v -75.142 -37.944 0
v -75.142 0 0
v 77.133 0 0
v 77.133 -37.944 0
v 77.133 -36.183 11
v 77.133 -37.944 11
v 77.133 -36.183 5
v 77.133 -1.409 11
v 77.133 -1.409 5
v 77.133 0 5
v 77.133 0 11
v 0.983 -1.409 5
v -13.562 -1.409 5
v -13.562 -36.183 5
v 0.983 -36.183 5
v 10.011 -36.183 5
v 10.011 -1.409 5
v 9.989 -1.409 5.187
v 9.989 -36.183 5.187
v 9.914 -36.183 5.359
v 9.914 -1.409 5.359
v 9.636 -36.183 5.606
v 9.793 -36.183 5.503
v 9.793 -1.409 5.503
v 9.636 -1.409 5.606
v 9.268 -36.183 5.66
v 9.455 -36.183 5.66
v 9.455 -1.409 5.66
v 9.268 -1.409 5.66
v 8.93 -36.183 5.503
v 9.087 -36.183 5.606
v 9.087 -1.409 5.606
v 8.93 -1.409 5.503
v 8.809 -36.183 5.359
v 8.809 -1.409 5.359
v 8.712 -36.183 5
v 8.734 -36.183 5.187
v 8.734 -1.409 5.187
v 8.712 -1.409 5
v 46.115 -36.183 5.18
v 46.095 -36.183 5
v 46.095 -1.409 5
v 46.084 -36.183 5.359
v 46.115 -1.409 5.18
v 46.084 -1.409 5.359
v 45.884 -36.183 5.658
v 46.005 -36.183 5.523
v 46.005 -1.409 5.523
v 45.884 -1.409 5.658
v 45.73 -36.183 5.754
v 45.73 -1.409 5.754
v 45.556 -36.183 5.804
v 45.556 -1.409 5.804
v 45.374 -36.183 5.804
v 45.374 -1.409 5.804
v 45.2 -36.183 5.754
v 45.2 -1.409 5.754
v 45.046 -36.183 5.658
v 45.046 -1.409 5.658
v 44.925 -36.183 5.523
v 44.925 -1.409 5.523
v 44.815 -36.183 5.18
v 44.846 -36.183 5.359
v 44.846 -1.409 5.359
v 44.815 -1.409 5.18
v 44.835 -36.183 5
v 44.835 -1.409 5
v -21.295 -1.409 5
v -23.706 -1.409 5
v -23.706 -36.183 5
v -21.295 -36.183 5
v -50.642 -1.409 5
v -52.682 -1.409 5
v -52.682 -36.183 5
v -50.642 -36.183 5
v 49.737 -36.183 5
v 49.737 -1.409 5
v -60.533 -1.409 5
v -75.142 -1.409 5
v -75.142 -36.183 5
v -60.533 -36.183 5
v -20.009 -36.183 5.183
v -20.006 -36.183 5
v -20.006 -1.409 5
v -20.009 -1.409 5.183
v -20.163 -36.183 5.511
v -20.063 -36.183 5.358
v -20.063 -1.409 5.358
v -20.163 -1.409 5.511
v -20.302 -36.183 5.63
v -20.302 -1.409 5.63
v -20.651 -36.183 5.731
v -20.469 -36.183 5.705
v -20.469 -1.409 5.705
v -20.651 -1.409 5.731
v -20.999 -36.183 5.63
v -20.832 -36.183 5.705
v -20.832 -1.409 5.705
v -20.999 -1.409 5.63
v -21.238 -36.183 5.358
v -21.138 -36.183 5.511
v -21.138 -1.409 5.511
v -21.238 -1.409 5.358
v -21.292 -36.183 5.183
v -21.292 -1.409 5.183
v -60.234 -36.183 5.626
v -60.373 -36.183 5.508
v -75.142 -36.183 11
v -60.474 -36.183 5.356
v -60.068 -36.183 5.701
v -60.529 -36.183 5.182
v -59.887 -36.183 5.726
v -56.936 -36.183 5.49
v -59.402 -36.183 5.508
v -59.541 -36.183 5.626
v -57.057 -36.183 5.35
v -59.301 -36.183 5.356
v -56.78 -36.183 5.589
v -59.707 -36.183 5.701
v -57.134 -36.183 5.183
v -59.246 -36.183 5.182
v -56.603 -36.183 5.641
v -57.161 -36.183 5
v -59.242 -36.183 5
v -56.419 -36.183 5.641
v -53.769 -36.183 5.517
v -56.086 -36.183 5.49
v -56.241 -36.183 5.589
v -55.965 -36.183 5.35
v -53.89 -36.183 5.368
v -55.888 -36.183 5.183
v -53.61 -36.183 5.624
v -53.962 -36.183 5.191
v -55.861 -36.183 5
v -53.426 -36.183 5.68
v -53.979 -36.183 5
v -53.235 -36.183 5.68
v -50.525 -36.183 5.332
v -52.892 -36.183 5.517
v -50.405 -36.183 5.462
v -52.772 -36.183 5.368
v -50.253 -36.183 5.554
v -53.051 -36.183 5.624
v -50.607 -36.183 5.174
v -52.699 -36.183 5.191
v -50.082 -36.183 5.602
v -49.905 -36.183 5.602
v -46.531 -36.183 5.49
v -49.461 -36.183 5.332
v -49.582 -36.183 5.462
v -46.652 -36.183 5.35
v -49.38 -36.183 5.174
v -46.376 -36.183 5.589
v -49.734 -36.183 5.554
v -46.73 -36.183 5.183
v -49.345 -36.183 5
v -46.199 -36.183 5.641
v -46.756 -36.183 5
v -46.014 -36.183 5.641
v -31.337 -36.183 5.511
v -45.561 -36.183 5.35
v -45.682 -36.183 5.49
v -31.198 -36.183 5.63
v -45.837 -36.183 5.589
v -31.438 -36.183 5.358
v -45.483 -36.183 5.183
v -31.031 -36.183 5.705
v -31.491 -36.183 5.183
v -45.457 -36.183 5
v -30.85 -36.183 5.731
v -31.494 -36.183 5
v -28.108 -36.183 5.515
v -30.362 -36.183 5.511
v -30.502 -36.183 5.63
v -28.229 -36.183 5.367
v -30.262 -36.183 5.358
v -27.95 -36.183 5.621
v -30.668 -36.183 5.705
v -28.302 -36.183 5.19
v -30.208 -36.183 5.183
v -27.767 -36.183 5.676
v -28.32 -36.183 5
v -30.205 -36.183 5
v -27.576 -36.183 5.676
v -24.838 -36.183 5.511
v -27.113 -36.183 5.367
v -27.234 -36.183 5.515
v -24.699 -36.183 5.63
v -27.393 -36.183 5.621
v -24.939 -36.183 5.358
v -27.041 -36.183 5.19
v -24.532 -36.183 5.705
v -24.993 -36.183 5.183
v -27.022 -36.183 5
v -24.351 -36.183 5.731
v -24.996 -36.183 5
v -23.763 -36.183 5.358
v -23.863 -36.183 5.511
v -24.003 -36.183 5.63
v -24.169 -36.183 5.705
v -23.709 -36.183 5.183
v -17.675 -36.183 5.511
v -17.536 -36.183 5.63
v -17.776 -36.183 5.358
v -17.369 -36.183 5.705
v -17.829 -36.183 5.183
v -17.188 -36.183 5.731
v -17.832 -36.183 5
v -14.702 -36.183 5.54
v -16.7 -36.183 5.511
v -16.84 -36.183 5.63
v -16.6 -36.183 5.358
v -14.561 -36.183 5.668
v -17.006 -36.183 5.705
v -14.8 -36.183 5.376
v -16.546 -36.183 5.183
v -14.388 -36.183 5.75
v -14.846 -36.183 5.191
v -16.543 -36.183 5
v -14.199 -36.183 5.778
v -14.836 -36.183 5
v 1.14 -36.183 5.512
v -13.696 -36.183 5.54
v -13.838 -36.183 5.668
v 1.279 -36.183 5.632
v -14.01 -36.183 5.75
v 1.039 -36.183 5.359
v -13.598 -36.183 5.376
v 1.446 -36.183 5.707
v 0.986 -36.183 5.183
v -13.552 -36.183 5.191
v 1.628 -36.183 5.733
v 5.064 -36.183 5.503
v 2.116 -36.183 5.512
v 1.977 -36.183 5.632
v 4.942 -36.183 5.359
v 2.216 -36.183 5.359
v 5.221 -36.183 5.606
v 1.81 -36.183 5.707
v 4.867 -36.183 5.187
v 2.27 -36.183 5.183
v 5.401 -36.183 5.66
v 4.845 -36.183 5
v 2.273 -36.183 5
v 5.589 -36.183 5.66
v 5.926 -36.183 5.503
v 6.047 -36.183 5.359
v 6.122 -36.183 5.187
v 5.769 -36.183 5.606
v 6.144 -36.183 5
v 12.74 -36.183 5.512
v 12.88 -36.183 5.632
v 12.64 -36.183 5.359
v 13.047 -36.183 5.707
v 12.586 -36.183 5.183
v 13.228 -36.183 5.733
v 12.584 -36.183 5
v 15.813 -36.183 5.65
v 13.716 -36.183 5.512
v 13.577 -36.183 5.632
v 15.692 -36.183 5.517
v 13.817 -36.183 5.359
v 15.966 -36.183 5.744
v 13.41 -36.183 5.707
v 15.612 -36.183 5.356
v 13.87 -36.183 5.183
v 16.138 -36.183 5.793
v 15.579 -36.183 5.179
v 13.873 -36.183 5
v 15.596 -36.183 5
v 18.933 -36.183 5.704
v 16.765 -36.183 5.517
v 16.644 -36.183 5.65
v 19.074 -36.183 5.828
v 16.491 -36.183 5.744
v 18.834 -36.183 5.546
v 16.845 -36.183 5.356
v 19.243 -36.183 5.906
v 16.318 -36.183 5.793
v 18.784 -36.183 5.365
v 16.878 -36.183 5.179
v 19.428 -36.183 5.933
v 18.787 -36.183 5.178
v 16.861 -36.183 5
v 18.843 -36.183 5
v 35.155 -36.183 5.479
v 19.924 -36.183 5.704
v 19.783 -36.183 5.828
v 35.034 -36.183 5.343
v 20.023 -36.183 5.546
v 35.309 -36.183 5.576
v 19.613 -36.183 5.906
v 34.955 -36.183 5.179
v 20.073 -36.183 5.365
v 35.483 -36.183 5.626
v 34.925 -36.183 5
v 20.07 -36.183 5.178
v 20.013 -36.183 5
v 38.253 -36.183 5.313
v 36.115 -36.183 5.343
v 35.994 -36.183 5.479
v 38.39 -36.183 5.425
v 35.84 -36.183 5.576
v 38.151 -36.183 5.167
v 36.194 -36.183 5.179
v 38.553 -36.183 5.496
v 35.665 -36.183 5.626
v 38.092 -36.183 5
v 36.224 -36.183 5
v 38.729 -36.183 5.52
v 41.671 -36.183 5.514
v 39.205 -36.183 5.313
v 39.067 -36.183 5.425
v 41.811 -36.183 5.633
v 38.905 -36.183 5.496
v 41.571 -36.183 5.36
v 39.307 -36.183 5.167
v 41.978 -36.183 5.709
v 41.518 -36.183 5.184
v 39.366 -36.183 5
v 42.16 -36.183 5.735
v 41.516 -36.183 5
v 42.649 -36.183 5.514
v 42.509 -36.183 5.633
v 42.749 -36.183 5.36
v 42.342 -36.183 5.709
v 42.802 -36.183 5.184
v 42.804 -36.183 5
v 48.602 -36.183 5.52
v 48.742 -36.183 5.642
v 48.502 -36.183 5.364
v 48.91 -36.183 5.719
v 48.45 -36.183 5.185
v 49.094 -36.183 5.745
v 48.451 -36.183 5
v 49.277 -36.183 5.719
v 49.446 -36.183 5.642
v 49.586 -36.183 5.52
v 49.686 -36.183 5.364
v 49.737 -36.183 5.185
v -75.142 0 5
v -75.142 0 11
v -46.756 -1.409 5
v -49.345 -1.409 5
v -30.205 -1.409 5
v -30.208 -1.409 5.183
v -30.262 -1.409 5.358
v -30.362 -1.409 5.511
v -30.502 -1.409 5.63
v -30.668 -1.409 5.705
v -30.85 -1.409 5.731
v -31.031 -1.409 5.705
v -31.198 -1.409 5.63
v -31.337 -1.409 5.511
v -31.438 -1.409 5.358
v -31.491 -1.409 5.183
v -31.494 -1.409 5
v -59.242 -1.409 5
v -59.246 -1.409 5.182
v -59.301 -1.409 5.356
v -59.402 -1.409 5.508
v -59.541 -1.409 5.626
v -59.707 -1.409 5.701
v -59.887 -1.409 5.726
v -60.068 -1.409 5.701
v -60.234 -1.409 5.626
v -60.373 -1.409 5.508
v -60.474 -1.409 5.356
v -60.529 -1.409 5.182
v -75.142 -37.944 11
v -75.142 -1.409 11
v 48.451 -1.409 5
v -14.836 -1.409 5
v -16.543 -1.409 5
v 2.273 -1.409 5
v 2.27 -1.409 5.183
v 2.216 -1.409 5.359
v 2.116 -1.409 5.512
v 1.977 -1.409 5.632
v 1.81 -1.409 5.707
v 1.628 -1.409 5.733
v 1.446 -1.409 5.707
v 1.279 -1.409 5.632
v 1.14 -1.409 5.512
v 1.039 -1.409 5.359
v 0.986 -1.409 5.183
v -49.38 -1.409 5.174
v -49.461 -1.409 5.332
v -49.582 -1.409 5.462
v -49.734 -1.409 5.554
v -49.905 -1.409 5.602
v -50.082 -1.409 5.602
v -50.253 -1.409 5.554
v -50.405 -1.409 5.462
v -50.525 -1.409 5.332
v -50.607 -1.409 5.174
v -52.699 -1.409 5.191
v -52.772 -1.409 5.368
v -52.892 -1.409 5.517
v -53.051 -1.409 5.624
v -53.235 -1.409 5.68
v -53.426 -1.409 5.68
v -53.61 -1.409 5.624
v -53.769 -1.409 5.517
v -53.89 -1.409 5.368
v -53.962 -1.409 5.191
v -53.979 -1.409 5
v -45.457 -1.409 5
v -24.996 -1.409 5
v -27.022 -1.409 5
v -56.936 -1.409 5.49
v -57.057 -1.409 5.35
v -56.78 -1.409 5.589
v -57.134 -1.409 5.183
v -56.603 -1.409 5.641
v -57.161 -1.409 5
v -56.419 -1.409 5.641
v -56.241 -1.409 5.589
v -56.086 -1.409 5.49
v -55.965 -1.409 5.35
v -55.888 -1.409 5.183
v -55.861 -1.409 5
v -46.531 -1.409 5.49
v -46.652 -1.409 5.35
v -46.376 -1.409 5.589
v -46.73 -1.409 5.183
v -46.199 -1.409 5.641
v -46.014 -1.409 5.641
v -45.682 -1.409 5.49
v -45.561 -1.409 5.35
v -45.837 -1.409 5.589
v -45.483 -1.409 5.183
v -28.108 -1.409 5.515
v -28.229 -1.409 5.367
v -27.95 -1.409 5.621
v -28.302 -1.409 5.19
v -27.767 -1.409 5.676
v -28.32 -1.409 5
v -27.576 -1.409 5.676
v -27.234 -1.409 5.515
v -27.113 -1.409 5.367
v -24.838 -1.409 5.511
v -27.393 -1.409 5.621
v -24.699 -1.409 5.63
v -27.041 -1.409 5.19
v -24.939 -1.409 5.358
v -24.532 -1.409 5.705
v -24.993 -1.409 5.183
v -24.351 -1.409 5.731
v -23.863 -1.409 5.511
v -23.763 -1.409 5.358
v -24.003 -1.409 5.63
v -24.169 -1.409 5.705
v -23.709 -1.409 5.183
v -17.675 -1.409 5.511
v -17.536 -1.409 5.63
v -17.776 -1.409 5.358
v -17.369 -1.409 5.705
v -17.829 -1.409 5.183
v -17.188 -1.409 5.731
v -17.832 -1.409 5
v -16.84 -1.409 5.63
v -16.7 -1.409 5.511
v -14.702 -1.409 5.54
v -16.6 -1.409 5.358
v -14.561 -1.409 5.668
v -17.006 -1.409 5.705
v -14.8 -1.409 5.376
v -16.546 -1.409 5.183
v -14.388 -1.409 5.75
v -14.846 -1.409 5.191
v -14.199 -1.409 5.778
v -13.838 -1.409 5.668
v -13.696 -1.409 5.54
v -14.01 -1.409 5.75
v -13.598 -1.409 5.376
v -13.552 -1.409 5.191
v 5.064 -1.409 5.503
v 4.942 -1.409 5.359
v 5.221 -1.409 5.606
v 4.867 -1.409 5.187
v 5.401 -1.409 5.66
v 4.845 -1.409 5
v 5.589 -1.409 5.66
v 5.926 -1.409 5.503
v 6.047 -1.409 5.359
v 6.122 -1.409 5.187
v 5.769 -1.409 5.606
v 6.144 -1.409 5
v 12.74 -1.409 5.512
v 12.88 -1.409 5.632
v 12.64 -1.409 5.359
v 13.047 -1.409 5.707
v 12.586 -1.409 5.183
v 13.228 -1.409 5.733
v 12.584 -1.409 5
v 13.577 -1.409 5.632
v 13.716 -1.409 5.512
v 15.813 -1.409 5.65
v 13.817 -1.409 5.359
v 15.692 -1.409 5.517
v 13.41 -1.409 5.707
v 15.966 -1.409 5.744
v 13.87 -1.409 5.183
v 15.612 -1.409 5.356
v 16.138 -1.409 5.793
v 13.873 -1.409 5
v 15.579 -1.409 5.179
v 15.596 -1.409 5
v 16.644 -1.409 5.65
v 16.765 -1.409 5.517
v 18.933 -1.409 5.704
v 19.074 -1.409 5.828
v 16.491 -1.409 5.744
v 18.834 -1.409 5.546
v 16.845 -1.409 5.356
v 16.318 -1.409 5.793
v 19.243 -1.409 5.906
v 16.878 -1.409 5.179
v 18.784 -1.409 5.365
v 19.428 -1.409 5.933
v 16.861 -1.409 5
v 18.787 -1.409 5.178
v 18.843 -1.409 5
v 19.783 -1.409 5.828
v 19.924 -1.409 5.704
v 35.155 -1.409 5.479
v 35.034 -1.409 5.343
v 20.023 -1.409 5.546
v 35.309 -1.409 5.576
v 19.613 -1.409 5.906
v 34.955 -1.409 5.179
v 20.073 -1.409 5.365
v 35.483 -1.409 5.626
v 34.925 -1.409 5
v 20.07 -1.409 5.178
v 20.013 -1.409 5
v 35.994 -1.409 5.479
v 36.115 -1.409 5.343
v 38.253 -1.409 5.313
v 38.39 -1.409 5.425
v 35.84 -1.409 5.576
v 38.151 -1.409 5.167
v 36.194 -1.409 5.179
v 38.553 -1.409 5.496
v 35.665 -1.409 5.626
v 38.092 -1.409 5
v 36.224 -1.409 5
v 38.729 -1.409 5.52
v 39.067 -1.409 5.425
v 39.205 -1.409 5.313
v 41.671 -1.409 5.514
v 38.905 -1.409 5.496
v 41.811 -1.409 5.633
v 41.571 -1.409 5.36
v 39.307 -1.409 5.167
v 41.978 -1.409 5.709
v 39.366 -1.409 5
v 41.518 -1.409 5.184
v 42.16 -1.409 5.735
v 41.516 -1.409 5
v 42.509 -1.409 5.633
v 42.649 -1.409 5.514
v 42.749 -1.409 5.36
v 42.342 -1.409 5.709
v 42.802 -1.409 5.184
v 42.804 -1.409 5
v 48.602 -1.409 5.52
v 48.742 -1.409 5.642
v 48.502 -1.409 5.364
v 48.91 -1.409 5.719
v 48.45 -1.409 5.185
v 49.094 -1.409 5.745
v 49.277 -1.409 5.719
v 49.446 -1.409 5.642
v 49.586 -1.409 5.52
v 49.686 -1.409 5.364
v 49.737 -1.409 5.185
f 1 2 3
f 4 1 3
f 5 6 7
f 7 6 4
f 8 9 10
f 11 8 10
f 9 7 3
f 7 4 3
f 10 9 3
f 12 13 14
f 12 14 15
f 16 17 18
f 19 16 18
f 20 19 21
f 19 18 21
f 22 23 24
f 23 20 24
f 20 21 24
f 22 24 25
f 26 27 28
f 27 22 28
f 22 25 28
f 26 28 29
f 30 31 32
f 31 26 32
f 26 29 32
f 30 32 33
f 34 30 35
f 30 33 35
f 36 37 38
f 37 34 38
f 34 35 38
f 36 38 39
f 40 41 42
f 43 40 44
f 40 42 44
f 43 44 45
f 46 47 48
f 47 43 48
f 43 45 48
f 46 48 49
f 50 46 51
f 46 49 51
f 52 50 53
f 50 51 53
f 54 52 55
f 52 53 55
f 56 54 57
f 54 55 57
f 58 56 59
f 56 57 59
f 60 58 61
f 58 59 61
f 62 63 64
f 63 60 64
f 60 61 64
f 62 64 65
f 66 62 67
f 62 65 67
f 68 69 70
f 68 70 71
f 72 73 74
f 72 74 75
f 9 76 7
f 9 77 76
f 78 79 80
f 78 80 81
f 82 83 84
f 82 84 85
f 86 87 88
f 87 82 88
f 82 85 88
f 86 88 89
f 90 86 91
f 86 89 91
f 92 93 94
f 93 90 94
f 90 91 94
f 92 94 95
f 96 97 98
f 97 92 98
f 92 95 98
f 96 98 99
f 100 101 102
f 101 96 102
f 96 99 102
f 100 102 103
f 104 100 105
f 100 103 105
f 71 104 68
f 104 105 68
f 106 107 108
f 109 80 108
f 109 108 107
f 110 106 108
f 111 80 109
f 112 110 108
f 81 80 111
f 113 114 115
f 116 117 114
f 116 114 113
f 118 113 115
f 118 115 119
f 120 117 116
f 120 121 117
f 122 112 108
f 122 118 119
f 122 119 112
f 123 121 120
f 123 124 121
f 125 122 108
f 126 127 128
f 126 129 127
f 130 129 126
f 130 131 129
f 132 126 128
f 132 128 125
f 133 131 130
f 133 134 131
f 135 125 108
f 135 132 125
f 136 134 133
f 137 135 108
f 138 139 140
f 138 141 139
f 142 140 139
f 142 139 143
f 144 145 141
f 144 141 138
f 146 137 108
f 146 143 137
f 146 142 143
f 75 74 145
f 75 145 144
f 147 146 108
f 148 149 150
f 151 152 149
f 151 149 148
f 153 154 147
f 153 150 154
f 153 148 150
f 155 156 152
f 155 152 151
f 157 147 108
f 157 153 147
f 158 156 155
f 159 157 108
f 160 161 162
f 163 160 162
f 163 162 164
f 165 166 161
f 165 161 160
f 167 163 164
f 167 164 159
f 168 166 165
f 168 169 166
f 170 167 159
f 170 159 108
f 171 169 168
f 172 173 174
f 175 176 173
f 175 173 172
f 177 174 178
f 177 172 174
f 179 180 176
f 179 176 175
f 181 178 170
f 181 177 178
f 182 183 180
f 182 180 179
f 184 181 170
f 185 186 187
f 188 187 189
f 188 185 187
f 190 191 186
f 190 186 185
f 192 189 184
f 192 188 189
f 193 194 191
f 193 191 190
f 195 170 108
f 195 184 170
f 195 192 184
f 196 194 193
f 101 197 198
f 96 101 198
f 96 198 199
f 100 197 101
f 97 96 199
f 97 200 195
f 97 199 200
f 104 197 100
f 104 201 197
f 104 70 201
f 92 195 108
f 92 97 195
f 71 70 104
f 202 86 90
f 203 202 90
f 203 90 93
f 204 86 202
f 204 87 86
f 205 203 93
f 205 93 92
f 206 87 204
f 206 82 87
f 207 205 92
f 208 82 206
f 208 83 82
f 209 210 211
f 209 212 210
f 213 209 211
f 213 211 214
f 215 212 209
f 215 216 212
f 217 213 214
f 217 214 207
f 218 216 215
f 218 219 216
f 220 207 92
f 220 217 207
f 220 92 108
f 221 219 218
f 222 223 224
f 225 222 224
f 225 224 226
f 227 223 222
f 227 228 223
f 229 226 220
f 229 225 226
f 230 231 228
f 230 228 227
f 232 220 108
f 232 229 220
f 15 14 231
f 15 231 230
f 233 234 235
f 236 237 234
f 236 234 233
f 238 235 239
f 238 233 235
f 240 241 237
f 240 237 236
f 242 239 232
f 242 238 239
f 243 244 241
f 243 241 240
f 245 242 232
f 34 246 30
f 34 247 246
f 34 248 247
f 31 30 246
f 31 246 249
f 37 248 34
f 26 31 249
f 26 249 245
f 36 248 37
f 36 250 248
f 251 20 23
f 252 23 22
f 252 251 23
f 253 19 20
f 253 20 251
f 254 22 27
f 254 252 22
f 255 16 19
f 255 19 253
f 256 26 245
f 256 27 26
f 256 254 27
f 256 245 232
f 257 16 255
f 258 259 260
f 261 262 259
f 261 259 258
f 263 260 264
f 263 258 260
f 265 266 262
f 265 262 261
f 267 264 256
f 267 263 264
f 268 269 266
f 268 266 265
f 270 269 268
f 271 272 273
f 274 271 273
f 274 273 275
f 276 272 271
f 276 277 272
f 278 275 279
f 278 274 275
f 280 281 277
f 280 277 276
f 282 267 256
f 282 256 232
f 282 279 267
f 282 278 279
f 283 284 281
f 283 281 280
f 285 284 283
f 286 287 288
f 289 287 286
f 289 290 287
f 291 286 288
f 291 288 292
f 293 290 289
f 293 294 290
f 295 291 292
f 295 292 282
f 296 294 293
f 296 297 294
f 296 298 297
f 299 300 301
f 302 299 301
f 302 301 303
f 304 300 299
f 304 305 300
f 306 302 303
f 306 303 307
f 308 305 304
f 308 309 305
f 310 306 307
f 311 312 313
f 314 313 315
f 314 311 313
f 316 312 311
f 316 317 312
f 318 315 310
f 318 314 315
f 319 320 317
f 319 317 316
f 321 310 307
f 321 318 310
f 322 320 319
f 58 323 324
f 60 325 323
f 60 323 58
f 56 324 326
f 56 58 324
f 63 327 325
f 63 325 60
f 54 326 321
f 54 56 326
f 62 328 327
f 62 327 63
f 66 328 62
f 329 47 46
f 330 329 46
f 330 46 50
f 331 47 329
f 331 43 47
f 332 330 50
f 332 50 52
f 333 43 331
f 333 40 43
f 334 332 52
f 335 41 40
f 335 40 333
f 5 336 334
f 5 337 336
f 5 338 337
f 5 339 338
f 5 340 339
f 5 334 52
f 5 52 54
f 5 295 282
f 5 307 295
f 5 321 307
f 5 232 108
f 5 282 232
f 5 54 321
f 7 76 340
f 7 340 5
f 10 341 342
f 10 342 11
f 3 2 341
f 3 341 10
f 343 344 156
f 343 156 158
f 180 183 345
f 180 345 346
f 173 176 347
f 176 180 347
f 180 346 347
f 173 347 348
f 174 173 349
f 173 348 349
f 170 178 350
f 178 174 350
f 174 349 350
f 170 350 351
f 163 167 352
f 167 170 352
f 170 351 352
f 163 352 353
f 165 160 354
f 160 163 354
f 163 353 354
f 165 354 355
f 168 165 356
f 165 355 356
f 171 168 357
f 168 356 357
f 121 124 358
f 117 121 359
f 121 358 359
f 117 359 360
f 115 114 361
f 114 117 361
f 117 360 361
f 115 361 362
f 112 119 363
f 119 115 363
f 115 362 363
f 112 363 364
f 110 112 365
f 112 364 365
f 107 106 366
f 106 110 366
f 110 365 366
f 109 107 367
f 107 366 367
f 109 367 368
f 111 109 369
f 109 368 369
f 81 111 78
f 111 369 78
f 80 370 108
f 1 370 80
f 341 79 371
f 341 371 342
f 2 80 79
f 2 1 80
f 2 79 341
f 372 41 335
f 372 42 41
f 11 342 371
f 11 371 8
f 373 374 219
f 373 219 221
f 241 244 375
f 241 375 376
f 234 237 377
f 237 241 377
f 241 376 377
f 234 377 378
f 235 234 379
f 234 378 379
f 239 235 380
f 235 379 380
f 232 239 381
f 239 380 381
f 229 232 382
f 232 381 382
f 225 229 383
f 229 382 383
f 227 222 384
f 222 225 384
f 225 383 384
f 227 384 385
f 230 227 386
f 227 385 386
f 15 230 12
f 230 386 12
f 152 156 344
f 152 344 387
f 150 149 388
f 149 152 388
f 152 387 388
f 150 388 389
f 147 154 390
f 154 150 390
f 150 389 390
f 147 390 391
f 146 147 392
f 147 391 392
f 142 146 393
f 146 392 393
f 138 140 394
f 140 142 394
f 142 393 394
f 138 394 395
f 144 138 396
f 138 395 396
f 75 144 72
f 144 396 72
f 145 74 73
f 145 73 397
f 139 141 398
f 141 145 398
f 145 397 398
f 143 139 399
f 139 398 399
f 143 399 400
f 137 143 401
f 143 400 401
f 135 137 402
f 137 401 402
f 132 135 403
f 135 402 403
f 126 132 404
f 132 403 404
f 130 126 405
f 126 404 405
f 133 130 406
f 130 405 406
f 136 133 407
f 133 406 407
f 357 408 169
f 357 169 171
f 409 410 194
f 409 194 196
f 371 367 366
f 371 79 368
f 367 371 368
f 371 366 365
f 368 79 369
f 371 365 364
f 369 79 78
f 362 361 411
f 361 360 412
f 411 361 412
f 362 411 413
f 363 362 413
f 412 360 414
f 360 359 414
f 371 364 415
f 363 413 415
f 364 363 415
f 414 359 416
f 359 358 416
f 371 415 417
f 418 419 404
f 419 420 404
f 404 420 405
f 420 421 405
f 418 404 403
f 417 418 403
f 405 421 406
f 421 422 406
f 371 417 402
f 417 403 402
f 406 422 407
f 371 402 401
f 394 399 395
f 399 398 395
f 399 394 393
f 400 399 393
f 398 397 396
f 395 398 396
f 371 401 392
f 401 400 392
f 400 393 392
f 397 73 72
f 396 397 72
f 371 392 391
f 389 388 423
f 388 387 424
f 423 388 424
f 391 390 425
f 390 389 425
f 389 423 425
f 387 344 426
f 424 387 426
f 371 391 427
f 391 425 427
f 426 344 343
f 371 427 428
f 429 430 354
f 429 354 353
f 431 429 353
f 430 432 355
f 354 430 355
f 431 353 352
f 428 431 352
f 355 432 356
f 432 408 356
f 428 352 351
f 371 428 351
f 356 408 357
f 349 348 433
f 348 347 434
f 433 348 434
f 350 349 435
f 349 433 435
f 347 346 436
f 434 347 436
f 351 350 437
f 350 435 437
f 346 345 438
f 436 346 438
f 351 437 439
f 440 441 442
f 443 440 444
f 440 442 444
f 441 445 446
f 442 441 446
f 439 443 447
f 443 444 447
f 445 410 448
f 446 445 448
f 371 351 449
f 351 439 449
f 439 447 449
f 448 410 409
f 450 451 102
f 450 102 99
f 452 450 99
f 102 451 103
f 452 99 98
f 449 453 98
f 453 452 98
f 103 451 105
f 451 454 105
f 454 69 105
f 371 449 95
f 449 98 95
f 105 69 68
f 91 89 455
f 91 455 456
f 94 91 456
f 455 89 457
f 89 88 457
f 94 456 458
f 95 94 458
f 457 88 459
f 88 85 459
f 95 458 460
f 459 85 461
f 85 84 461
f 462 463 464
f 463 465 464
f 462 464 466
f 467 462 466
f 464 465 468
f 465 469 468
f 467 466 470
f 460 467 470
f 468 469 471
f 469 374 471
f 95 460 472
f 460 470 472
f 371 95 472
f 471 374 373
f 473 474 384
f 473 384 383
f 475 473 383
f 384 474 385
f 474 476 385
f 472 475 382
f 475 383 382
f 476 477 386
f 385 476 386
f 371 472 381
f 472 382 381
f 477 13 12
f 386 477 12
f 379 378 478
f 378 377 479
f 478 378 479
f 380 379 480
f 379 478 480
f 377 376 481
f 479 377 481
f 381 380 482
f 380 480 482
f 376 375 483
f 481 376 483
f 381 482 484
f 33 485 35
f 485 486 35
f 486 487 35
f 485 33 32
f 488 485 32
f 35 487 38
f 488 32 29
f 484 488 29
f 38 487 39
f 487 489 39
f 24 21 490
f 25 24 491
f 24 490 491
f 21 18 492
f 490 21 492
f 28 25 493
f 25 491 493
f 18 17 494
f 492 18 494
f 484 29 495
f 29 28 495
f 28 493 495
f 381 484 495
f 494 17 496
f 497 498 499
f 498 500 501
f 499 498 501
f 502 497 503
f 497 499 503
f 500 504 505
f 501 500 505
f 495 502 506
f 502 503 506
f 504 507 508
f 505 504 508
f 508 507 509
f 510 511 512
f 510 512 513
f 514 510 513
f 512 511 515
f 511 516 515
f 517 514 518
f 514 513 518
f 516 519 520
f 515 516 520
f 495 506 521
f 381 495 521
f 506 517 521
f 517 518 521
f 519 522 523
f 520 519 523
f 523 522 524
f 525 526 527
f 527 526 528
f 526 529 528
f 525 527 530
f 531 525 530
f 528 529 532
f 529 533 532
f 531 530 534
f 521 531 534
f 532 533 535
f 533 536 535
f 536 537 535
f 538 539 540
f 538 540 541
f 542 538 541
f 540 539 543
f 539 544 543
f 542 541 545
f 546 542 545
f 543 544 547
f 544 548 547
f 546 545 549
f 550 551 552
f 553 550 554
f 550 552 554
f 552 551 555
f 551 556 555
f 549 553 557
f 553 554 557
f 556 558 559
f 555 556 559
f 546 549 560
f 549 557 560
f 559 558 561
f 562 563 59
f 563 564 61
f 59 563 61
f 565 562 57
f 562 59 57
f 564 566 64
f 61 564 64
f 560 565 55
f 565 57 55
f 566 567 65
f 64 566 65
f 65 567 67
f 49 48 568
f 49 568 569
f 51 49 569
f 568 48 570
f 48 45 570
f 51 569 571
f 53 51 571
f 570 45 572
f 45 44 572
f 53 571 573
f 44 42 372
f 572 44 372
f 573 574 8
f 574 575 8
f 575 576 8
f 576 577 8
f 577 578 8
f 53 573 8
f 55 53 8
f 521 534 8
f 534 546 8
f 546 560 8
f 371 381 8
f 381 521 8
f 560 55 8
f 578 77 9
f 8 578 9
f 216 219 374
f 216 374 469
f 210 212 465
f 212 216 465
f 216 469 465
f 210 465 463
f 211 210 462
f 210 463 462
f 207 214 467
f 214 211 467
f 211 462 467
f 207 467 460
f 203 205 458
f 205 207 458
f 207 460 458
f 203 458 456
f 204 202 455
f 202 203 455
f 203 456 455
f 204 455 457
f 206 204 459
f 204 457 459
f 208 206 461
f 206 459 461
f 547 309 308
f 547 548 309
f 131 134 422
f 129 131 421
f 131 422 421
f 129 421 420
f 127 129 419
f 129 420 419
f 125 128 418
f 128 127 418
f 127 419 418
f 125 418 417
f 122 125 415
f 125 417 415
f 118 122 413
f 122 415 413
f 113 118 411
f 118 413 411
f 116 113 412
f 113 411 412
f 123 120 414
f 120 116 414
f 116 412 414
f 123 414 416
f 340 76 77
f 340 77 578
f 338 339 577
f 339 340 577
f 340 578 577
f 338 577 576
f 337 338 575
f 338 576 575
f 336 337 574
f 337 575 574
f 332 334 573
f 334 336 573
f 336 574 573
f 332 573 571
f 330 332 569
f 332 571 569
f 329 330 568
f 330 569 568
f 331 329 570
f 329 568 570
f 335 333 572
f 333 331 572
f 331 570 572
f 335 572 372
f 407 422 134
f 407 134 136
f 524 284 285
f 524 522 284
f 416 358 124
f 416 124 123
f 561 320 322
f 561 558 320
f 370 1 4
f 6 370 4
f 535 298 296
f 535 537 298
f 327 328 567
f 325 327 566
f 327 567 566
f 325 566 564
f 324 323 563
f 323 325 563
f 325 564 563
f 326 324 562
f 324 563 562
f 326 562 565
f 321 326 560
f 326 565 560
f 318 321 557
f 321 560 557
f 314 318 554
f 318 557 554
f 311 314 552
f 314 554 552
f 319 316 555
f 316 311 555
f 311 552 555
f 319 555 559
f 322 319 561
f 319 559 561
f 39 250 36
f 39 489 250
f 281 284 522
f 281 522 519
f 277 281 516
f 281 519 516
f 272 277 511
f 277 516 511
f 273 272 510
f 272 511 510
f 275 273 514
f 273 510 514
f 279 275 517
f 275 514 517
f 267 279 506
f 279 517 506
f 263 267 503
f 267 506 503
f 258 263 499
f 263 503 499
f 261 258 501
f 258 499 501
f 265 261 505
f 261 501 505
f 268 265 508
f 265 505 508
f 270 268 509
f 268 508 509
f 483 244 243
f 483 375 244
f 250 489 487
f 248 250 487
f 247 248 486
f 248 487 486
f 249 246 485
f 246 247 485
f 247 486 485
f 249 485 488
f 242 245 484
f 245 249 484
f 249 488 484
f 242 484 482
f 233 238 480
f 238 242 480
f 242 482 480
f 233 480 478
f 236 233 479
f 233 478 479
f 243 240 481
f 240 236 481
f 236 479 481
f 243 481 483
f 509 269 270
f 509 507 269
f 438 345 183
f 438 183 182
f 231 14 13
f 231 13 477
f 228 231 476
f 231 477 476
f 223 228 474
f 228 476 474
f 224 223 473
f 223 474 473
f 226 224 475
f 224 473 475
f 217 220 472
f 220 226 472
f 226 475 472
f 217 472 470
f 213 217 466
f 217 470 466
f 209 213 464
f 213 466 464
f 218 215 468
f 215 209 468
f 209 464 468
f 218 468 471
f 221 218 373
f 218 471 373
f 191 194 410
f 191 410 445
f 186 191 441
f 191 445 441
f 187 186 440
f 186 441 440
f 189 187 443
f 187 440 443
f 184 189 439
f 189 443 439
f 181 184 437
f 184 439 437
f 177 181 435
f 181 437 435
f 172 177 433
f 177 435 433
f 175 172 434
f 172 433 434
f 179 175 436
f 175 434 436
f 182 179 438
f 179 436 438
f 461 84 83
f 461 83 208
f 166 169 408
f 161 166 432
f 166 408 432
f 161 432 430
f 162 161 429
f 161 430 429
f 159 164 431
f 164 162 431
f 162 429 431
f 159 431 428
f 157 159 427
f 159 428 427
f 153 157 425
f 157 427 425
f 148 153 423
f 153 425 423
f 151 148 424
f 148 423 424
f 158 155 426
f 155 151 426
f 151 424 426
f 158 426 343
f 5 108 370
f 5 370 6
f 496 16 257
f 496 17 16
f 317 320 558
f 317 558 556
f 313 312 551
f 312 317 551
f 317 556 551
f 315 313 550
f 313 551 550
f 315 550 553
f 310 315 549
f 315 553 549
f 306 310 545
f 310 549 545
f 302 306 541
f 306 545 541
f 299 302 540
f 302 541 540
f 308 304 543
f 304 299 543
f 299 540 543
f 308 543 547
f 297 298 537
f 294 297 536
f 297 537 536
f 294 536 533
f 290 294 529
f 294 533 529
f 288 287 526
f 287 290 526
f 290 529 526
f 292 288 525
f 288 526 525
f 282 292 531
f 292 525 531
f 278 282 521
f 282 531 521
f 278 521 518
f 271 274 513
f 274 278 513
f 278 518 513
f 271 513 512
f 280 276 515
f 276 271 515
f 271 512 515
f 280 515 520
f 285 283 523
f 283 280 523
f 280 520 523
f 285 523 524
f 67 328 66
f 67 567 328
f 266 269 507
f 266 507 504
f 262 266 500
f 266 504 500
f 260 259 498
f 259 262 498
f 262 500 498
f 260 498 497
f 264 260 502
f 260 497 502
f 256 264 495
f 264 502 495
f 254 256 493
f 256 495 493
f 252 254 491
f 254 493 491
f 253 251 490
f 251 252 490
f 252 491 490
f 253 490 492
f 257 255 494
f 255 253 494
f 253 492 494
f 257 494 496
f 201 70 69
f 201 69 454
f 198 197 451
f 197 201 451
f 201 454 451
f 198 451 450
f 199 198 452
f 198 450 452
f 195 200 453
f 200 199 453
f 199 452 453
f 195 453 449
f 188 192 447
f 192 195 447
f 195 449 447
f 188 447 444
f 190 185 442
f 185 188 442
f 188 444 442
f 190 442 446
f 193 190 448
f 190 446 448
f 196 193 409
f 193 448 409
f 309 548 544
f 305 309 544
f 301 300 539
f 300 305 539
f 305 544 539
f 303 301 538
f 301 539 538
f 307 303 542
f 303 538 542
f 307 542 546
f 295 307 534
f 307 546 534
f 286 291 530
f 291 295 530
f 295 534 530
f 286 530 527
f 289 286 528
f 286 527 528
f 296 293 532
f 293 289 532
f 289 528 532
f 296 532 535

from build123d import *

# Parameters (mm, degrees)
F0_W     = 152.2748842835
F0_H     = 37.9443131387
F1_DEPTH = 5
F5_R     = 0.6498911682
F6_DEPTH = 37.9
F2_W     = 152.2748842835
F2_H     = 1.4094897779
F2_H_2   = 1.7610266805
F7_DEPTH = 6


# Not quite as in the source:
# - the program builds the solid bodies; features that only make, move or delete a surface that nothing else refers to are left out


with BuildPart() as f1:
    # F0 (on Top) → F1 (new body)
    with BuildSketch(Plane.XY):
        with Locations((0.995259732, -18.9721565694)):
            Rectangle(F0_W, F0_H)
    extrude(amount=F1_DEPTH)

    # F5 (on Front) → F6 (join)
    with BuildSketch(Plane.XZ):
        with Locations((-59.8872974515, 5.076338537)):
            Circle(F5_R)
        with Locations((-56.5108135343, 4.9978159368)):
            Circle(F5_R)
        with Locations((-46.1065284908, 4.9978159368)):
            Circle(F5_R)
        with Locations((-49.9934107065, 4.958554171)):
            Circle(F5_R)
        with Locations((-53.3306375146, 5.0370772369)):
            Circle(F5_R)
        with Locations((-30.849635601, 5.0810105167)):
            Circle(F5_R)
        with Locations((-14.1990464181, 5.1284483634)):
            Circle(F5_R)
        with Locations((-17.1876139939, 5.0810105167)):
            Circle(F5_R)
        with Locations((-20.650556311, 5.0810105167)):
            Circle(F5_R)
        with Locations((-24.3506878614, 5.0810105167)):
            Circle(F5_R)
        with Locations((-27.6713185012, 5.0335731357)):
            Circle(F5_R)
        with Locations((1.6279553529, 5.0831306726)):
            Circle(F5_R)
        with Locations((19.4284114987, 5.2831359208)):
            Circle(F5_R)
        with Locations((16.2283293903, 5.1497989334)):
            Circle(F5_R)
        with Locations((13.2282525301, 5.0831306726)):
            Circle(F5_R)
        with Locations((9.361486882, 5.0164619461)):
            Circle(F5_R)
        with Locations((5.4947216995, 5.0164619461)):
            Circle(F5_R)
        with Locations((49.0938574076, 5.0953882746)):
            Circle(F5_R)
        with Locations((45.4649962485, 5.1608970389)):
            Circle(F5_R)
        with Locations((42.1599261463, 5.0851320848)):
            Circle(F5_R)
        with Locations((38.728825748, 4.870061297)):
            Circle(F5_R)
        with Locations((35.5742499232, 4.9827247858)):
            Circle(F5_R)
    extrude(amount=F6_DEPTH)

    # F2 (on face) → F7 (join)
    with BuildSketch(Plane.XY.offset(5)):
        with Locations((0.995259732, -0.7047448889)):
            Rectangle(F2_W, F2_H)
        with Locations((0.995259732, -37.0637997985)):
            Rectangle(F2_W, F2_H_2)
    extrude(amount=F7_DEPTH)


solid = f1.part
